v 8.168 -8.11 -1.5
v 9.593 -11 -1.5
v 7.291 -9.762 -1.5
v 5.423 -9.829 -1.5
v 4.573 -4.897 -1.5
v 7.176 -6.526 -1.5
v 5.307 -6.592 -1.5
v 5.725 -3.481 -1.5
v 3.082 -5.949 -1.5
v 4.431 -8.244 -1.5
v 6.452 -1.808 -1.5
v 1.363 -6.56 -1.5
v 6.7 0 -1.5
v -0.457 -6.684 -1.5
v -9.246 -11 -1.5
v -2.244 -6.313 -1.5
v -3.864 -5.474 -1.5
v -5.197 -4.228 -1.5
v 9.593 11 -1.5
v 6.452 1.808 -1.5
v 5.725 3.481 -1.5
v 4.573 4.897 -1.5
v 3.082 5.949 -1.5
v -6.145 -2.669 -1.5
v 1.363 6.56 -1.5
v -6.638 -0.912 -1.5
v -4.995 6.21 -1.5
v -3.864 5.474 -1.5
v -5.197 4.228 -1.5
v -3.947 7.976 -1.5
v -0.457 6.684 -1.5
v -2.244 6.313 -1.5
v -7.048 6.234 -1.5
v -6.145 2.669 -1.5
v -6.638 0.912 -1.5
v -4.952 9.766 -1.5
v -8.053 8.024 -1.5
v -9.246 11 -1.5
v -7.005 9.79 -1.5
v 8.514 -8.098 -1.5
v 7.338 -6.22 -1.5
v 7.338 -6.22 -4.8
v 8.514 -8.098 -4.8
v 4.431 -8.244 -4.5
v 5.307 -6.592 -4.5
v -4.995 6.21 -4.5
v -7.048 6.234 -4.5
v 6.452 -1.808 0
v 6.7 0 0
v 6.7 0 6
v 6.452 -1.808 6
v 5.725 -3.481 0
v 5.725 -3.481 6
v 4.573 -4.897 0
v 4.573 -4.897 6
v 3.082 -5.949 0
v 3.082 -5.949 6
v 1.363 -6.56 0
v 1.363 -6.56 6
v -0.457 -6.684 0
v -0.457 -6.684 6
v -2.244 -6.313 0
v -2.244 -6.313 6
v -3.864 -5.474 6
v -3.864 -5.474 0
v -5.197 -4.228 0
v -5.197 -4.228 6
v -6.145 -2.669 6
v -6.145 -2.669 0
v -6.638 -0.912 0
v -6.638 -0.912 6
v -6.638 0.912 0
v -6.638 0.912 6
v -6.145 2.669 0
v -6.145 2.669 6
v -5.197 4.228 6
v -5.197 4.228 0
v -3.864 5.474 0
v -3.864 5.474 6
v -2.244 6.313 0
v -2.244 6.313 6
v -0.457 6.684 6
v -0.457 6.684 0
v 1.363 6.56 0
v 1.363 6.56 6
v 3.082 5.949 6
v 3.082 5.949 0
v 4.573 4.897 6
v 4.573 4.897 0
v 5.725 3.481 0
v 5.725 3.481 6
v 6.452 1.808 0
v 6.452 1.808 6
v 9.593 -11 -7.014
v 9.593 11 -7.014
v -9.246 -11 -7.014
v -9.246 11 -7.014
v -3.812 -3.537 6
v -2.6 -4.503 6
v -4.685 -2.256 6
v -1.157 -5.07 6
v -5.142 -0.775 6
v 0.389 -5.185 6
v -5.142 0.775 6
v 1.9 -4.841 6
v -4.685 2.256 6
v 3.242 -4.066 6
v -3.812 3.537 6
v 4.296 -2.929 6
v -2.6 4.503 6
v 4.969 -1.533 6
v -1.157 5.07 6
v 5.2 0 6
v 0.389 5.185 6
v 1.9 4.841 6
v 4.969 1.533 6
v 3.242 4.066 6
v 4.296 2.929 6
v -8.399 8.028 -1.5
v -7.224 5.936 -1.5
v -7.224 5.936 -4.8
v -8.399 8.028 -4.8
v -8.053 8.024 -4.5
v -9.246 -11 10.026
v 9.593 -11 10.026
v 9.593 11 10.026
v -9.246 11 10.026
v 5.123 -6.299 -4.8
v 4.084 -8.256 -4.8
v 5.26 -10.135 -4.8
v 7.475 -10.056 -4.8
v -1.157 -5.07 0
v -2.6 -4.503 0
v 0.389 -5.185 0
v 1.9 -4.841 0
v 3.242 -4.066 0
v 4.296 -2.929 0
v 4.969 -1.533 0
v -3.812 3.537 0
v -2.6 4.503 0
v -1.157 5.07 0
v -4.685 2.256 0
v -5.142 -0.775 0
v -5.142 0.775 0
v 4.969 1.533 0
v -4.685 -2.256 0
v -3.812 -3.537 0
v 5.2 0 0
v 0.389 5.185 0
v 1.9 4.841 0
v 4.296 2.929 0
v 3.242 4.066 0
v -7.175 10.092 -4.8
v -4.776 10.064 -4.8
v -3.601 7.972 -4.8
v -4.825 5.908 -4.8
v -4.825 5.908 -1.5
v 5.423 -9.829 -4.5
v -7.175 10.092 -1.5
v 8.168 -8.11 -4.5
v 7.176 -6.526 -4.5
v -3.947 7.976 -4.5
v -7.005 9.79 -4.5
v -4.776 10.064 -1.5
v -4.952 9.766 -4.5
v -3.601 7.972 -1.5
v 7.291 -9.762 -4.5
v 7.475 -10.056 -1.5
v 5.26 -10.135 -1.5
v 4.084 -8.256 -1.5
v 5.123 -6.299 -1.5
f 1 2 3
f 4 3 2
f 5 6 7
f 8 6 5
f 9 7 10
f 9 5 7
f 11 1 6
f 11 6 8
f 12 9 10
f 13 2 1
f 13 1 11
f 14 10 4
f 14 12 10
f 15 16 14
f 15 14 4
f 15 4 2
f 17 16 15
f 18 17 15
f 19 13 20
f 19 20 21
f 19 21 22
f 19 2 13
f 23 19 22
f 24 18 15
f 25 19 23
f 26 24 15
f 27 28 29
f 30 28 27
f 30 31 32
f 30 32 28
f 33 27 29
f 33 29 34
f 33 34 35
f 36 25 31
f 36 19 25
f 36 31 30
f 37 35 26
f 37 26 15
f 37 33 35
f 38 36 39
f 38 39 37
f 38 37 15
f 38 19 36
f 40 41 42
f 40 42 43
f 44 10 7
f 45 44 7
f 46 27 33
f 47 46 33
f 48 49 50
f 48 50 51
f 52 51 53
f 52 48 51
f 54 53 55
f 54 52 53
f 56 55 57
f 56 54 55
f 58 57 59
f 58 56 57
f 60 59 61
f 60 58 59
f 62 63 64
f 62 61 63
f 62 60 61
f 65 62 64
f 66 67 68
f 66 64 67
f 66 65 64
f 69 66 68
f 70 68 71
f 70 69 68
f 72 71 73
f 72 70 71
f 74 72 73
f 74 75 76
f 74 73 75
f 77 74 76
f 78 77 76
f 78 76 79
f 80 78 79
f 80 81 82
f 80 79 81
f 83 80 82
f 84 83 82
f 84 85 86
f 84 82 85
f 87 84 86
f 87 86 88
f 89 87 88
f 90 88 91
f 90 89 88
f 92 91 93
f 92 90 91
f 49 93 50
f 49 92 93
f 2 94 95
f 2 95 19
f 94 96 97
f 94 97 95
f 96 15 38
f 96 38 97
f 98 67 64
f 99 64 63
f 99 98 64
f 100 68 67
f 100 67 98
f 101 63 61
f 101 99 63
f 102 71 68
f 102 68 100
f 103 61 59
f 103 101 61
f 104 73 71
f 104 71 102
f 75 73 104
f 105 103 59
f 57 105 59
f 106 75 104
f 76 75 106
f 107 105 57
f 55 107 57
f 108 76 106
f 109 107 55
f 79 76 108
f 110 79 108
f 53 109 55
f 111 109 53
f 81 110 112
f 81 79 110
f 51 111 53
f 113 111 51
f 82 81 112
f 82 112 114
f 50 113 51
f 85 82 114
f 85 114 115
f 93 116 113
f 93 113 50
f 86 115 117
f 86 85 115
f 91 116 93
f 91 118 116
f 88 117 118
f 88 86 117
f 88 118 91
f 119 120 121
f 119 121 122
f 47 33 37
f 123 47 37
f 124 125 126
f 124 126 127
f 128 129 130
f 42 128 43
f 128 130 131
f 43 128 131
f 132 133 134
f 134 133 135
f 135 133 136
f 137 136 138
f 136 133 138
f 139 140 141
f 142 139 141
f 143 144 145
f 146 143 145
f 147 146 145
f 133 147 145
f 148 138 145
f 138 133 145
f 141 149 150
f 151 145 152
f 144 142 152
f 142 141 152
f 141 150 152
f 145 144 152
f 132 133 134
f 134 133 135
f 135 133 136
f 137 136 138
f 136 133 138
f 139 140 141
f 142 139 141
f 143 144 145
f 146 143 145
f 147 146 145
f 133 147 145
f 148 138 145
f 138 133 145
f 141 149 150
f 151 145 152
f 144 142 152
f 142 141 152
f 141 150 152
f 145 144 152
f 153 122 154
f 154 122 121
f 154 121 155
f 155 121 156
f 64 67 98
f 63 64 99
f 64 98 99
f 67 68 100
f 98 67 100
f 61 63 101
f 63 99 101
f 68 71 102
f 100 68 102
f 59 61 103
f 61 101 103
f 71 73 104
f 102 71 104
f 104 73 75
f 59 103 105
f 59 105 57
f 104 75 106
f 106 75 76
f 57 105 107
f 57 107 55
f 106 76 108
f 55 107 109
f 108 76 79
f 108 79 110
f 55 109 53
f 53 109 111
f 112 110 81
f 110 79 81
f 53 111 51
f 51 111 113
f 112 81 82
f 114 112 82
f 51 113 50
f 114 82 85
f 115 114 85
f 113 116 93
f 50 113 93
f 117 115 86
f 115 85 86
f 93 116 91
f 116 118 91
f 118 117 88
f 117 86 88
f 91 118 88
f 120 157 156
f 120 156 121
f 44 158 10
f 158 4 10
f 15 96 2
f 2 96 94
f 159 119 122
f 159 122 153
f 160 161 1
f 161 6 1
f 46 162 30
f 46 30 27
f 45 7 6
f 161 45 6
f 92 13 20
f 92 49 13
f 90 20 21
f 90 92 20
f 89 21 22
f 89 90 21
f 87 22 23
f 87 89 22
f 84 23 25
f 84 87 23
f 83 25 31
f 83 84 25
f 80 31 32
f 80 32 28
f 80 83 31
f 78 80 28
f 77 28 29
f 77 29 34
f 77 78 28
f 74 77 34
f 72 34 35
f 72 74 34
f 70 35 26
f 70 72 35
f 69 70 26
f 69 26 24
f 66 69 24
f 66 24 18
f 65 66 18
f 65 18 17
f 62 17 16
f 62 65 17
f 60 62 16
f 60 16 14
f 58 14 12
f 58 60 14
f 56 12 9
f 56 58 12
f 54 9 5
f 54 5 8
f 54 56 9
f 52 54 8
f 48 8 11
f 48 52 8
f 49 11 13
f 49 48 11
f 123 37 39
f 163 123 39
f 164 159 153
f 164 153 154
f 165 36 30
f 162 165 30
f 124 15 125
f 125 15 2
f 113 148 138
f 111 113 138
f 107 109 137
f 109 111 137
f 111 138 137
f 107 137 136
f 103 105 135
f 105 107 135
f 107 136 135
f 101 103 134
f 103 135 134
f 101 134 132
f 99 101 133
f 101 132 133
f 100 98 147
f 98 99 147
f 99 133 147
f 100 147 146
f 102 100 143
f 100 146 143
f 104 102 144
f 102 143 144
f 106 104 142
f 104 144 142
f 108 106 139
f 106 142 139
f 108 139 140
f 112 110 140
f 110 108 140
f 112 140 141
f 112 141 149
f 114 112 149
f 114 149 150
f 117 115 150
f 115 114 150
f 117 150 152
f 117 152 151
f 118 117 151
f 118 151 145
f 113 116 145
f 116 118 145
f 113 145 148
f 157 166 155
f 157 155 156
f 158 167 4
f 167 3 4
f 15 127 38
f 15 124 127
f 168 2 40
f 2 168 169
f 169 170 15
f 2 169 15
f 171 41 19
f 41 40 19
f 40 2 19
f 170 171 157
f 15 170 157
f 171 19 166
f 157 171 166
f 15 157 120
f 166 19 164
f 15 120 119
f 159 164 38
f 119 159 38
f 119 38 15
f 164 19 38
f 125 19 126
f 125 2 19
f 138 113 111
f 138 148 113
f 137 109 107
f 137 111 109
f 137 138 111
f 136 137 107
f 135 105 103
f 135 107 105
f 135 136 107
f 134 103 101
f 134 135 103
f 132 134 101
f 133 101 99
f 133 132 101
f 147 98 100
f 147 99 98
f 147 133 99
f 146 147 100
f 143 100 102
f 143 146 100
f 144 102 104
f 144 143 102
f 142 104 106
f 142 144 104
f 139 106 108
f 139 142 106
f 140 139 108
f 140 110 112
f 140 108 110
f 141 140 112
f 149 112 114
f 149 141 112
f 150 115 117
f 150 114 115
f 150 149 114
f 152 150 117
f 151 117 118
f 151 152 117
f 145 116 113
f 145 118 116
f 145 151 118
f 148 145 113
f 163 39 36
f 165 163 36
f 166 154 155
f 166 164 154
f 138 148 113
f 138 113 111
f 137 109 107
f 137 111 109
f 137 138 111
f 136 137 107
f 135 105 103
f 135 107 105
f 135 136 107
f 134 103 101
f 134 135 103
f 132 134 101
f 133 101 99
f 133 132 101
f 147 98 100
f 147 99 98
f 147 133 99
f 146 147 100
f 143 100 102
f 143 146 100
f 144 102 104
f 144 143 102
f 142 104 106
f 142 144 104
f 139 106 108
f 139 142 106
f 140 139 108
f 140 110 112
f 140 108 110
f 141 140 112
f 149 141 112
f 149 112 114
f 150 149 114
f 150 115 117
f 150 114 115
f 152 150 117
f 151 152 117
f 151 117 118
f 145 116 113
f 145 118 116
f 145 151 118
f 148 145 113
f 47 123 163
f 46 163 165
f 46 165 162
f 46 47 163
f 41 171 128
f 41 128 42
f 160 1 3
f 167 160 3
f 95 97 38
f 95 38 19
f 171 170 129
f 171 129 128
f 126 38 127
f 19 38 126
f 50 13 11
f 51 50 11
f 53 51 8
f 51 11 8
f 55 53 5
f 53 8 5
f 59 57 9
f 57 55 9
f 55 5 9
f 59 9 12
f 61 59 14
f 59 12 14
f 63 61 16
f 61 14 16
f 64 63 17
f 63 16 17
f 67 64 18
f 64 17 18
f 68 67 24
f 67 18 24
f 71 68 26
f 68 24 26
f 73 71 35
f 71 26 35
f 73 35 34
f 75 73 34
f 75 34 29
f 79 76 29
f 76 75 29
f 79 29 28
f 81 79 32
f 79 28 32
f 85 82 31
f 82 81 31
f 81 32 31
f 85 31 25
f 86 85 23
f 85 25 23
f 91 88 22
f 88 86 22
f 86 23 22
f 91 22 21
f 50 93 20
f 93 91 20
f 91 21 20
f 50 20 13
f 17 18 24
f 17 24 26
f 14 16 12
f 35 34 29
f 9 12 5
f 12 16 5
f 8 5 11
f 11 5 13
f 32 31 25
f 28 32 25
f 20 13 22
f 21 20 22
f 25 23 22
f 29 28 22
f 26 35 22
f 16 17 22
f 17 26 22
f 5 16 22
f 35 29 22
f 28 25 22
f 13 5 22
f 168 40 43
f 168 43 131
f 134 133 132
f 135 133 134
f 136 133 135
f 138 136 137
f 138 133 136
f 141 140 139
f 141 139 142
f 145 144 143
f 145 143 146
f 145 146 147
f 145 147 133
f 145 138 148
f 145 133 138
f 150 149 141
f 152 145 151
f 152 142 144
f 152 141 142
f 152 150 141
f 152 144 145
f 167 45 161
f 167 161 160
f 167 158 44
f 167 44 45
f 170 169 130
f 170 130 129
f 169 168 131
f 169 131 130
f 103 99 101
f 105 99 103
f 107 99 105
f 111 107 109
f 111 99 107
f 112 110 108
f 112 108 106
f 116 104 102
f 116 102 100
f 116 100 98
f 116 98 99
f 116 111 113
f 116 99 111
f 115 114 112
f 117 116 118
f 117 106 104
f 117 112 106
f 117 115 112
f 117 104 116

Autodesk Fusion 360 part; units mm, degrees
sketch "Sketch1" plane through (0, 0, 0) normal (0, 0, 1) x (1, 0, 0) in component "Haptic Motor"
  circle A0 centre (0, 0) radius 5.2
  dimension "d1" = 10.4
extrude "Extrude1" add sketch "Sketch1" along normal blind 6 makes body 1 in component "Haptic Motor"
sketch "Sketch1 (2)" plane through (0, 0, 0) normal (0, 0, 1) x (1, 0, 0) in component "Haptic Cover"
  circle A0 centre (0, 0) radius 5.2
  circle A1 centre (0, 0) radius 6.7
  dimension "d4" = 1.5
extrude "Extrude1'" add sketch "Sketch1 (2)" along normal blind 6 separate body makes body 2 in component "Haptic Cover"
extrude "Extrude2" add sketch "Sketch1 (2)" against normal blind 1.5 contours A0 | A1 bodies 2 in component "Haptic Cover"
sketch "Sketch1 (3)" plane through (0, 0, 0) normal (0, 1, 0) x (1, 0, 0) in component "Mold"
  line L0 (9.593, -10.0264) -> (-9.2463, -10.0264)
  line L1 (-9.2463, -10.0264) -> (-9.2463, 7.0138)
  line L2 (-9.2463, 7.0138) -> (9.593, 7.0138)
  line L3 (9.593, 7.0138) -> (9.593, -10.0264)
extrude "Extrude1''" add sketch "Sketch1 (3)" along normal mid plane 22 separate body makes body 3 in component "Mold"
ref_plane "WorkPlane1" through (0, 0, -1.5) normal (0, 0, -1) x (-1, 0, 0) in component "Mold"
combine "Combine1" operation cut target body 3 tool bodies 2 keep tools in component "Mold"
split "Split1" by plane through (0, 0, -1.5) normal (0, 0, -1) bodies 3 makes body 4 at (-2.9665, -3.6667, -7.0138) in component "Mold"
sketch "Sketch2" plane through (0, 0, -1.5) normal (0, 0, -1) x (1, 0, 0) in component "Mold"
  line L0 (9.593, 11) -> (-9.2463, 11)
  line L1 (-9.2463, 11) -> (-9.2463, -11)
  line L2 (-9.2463, -11) -> (9.593, -11)
  line L3 (9.593, -11) -> (9.593, 11)
  circle A0 centre (0, 0) radius 6.7
  line L4 (-3.9471, -7.9756) -> (-4.9947, -6.21)
  line L5 (-4.9947, -6.21) -> (-7.0475, -6.2343)
  line L6 (-7.0475, -6.2343) -> (-8.0529, -8.0244)
  line L7 (-8.0529, -8.0244) -> (-7.0053, -9.79)
  line L8 (-7.0053, -9.79) -> (-4.9525, -9.7657)
  line L9 (-4.9525, -9.7657) -> (-3.9471, -7.9756)
  line L10 (7.1755, 6.5257) -> (8.1675, 8.1105)
  line L11 (8.1675, 8.1105) -> (7.291, 9.7619)
  line L12 (7.291, 9.7619) -> (5.4226, 9.8287)
  line L13 (5.4226, 9.8287) -> (4.4306, 8.2439)
  line L14 (4.4306, 8.2439) -> (5.307, 6.5925)
  line L15 (5.307, 6.5925) -> (7.1755, 6.5257)
  line L16 (-8.3993, -8.0285) -> (-7.175, -10.0921)
  line L17 (-7.175, -10.0921) -> (-4.7757, -10.0636)
  line L18 (-4.7757, -10.0636) -> (-3.6007, -7.9715)
  line L19 (-3.6007, -7.9715) -> (-4.825, -5.9079)
  line L20 (-4.825, -5.9079) -> (-7.2243, -5.9364)
  line L21 (-7.2243, -5.9364) -> (-8.3993, -8.0285)
  line L22 (5.1232, 6.2988) -> (7.3378, 6.2197)
  line L23 (7.3378, 6.2197) -> (8.5136, 8.0981)
  line L24 (8.5136, 8.0981) -> (7.4748, 10.0555)
  line L25 (7.4748, 10.0555) -> (5.2602, 10.1346)
  line L26 (5.2602, 10.1346) -> (4.0844, 8.2563)
  line L27 (4.0844, 8.2563) -> (5.1232, 6.2988)
  point P0 (-6, -8)
  point P1 (6.299, 8.1772)
  dimension "d12" = 0.3
  dimension "d13" = 0.3
extrude "Extrude2'" add sketch "Sketch2" along normal blind 3 contours L4 L5 L6 L7 L8 L9 | L10 L11 L12 L13 L14 L15 bodies 3 in component "Mold"
extrude "Extrude3" cut sketch "Sketch2" along normal blind 3.3 contours L4 L5 L6 L7 L8 L9 | L10 L11 L12 L13 L14 L15 | L16 L17 L18 L19 L20 L21 | L22 L23 L24 L25 L26 L27 bodies 4 in component "Mold"
ref_plane "WorkPlane2" through (0.1734, 8, 4.2632) normal (0, 1, 0) x (0, 0, 1) in component "Mold"
component "Haptic Motor" placed x (1, 0, 0) y (0, 1, 0) z (0, 0, 1) at (0, 0, 0)
component "Haptic Cover" placed x (1, 0, 0) y (0, 1, 0) z (0, 0, 1) at (0, 0, 0)
component "Mold" placed x (1, 0, 0) y (0, 1, 0) z (0, 0, 1) at (0, 0, 0)
